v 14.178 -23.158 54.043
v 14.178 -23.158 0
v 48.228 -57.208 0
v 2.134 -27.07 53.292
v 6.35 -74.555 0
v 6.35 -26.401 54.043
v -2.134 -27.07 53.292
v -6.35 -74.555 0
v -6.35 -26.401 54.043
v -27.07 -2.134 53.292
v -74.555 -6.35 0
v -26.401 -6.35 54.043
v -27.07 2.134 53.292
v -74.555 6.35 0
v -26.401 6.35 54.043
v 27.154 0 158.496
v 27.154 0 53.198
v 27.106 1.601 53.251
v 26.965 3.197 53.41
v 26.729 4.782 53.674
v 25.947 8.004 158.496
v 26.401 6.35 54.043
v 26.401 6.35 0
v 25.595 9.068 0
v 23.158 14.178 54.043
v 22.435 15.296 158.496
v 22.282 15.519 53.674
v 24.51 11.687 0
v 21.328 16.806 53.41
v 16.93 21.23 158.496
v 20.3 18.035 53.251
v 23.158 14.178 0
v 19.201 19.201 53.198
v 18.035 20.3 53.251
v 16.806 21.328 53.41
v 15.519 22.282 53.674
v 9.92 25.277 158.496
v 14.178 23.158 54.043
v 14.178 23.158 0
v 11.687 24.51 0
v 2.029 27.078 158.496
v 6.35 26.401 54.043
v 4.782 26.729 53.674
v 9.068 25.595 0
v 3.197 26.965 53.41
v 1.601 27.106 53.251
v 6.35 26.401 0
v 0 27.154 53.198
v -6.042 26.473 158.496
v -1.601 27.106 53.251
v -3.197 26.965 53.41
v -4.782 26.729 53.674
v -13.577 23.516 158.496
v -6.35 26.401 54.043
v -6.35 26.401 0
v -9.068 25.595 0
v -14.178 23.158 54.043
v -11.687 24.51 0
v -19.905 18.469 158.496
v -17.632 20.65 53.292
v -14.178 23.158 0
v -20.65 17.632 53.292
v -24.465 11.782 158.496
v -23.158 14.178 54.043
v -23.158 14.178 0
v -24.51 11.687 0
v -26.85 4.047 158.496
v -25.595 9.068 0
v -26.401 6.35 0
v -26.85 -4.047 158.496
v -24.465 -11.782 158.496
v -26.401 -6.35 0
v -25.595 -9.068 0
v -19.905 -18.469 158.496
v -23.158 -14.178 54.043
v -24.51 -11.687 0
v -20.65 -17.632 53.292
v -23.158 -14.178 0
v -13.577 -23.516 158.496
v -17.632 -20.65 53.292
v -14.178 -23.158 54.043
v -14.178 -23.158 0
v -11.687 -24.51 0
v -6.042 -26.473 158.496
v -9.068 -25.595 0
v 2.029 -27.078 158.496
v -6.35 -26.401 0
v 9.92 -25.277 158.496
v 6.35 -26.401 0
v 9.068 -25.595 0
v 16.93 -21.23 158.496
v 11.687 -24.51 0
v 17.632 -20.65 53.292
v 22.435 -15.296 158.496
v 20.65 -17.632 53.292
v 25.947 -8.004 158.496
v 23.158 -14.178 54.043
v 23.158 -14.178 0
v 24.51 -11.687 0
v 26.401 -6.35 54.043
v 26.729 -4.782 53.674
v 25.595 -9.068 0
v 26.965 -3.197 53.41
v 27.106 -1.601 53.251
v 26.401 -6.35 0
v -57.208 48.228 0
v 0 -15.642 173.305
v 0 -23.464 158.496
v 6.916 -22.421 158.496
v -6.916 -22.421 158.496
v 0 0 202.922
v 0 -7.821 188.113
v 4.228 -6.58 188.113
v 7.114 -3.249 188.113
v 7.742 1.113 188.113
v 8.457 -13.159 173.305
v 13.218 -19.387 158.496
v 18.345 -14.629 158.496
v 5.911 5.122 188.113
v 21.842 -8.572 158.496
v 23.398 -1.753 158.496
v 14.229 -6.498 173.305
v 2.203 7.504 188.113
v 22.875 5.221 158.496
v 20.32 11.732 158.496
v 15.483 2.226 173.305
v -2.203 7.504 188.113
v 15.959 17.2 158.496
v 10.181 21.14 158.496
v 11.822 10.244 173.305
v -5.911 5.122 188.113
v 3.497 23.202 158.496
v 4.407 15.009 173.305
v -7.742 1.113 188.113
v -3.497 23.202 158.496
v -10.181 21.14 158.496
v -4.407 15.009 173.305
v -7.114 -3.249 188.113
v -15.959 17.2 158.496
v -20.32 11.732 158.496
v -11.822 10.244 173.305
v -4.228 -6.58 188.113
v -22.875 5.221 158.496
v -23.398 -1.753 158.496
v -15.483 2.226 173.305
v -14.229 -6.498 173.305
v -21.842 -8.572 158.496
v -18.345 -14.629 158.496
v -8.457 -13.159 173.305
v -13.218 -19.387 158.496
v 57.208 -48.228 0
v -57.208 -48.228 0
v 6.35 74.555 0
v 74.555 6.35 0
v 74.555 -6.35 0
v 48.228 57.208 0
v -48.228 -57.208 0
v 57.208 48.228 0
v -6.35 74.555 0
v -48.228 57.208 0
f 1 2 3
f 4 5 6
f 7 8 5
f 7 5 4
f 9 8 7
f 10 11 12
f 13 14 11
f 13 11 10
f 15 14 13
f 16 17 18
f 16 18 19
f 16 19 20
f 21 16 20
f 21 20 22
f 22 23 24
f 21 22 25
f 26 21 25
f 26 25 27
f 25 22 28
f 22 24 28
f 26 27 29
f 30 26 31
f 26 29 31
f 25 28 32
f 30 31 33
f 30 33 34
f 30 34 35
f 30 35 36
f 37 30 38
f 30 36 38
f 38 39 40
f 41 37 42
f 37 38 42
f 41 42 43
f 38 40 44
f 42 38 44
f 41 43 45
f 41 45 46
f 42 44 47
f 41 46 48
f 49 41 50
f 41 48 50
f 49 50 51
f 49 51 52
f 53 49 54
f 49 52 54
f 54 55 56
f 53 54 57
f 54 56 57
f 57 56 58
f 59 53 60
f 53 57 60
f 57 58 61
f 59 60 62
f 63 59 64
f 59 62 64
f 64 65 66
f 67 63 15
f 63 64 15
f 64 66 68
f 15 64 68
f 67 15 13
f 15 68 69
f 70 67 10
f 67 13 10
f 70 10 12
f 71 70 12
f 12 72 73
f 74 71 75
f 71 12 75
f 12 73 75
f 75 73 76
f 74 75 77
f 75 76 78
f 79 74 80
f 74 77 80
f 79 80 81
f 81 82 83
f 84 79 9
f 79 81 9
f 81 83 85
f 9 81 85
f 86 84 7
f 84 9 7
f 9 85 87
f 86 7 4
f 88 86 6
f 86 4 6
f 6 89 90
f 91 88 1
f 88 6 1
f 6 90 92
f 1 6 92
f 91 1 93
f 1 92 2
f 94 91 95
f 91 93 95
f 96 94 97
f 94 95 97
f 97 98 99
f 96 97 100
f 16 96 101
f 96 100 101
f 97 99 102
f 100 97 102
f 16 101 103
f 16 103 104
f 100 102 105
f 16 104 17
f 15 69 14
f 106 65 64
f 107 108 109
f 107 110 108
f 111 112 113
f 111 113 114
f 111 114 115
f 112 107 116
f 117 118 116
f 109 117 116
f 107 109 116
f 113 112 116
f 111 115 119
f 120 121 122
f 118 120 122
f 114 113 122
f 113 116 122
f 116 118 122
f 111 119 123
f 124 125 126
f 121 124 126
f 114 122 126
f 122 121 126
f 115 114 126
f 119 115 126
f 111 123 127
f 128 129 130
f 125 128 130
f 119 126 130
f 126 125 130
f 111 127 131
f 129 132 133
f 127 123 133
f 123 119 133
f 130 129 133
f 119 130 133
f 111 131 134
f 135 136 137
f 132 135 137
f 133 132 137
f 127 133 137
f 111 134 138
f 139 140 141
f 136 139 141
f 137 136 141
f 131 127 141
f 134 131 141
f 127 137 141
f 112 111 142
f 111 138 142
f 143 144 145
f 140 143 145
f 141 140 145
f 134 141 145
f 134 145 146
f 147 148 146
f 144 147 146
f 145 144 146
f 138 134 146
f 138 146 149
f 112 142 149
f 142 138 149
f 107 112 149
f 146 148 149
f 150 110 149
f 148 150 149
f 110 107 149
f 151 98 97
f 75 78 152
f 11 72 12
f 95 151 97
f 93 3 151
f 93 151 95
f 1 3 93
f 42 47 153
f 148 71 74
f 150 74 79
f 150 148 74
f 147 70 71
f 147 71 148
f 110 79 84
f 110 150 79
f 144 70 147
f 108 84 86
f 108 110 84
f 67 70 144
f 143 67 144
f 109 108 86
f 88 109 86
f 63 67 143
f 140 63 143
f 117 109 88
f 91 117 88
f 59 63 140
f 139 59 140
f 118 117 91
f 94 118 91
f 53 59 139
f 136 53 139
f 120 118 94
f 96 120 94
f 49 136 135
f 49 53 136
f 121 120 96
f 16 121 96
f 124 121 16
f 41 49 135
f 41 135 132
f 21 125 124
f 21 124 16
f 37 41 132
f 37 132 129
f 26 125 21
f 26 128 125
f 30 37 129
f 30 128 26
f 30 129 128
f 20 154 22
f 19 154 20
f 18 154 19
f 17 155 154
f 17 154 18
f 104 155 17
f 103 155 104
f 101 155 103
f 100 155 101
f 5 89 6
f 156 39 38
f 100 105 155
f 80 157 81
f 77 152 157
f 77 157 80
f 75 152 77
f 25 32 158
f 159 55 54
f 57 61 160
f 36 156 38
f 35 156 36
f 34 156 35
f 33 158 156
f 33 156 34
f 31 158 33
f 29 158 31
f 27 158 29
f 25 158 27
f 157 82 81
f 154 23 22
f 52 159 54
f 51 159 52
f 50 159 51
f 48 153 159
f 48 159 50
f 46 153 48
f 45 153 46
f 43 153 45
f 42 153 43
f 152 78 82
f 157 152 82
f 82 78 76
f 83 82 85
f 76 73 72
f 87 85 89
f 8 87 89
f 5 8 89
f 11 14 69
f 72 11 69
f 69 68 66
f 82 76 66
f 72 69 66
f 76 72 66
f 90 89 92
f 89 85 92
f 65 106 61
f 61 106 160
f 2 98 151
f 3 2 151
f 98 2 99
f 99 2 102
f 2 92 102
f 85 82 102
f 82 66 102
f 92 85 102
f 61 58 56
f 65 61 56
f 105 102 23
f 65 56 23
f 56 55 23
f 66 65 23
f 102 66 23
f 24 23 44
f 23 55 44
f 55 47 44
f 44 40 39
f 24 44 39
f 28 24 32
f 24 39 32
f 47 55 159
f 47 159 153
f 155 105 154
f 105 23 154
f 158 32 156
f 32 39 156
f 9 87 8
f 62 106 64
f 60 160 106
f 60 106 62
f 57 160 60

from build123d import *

# Parameters (mm, degrees)
F0_R     = 27.153692
F1_DEPTH = 158.496
F3_DEPTH = 6.35
F4_COUNT = 8


with BuildPart() as f1:
    # F0 (on Top) → F1 (new body)
    with BuildSketch(Plane.XY):
        Circle(F0_R)
    extrude(amount=F1_DEPTH)

    # F2 (on Right) → F3 (join, symmetric)
    with BuildSketch(Plane.YZ):
        Polygon((6.657729, 76.2), (6.657729, 0), (74.554974, 0), align=None)
    extrude(amount=F3_DEPTH, both=True)



with BuildPart() as f4_1:
    # F4: instance of F1
    add(f1.part.rotate(Axis((0, 0, 0), (0, 0, -1)), 1 * 360 / F4_COUNT))


with BuildPart() as f4_2:
    # F4: instance of F1
    add(f1.part.rotate(Axis((0, 0, 0), (0, 0, -1)), 2 * 360 / F4_COUNT))


with BuildPart() as f4_3:
    # F4: instance of F1
    add(f1.part.rotate(Axis((0, 0, 0), (0, 0, -1)), 3 * 360 / F4_COUNT))


with BuildPart() as f4_4:
    # F4: instance of F1
    add(f1.part.rotate(Axis((0, 0, 0), (0, 0, -1)), 4 * 360 / F4_COUNT))


with BuildPart() as f4_5:
    # F4: instance of F1
    add(f1.part.rotate(Axis((0, 0, 0), (0, 0, -1)), 5 * 360 / F4_COUNT))


with BuildPart() as f4_6:
    # F4: instance of F1
    add(f1.part.rotate(Axis((0, 0, 0), (0, 0, -1)), 6 * 360 / F4_COUNT))


with BuildPart() as f4_7:
    # F4: instance of F1
    add(f1.part.rotate(Axis((0, 0, 0), (0, 0, -1)), 7 * 360 / F4_COUNT))


with BuildPart() as f1_1:
    add(f1.part)

    add(f4_1.part)  # F6 merges F4_1

    add(f4_2.part)  # F6 merges F4_2

    add(f4_3.part)  # F6 merges F4_3

    add(f4_4.part)  # F6 merges F4_4

    add(f4_5.part)  # F6 merges F4_5

    add(f4_6.part)  # F6 merges F4_6

    add(f4_7.part)  # F6 merges F4_7
    # F5 (on Right) → F6 (revolve)
    with BuildSketch(Plane.YZ):
        Polygon((-25.58529, 154.478967), (0, 154.478967), (0, 202.92218), align=None)
    revolve(axis=Axis((0, 0, 178.700574), (0, 0, 1)))


solid = f1_1.part
